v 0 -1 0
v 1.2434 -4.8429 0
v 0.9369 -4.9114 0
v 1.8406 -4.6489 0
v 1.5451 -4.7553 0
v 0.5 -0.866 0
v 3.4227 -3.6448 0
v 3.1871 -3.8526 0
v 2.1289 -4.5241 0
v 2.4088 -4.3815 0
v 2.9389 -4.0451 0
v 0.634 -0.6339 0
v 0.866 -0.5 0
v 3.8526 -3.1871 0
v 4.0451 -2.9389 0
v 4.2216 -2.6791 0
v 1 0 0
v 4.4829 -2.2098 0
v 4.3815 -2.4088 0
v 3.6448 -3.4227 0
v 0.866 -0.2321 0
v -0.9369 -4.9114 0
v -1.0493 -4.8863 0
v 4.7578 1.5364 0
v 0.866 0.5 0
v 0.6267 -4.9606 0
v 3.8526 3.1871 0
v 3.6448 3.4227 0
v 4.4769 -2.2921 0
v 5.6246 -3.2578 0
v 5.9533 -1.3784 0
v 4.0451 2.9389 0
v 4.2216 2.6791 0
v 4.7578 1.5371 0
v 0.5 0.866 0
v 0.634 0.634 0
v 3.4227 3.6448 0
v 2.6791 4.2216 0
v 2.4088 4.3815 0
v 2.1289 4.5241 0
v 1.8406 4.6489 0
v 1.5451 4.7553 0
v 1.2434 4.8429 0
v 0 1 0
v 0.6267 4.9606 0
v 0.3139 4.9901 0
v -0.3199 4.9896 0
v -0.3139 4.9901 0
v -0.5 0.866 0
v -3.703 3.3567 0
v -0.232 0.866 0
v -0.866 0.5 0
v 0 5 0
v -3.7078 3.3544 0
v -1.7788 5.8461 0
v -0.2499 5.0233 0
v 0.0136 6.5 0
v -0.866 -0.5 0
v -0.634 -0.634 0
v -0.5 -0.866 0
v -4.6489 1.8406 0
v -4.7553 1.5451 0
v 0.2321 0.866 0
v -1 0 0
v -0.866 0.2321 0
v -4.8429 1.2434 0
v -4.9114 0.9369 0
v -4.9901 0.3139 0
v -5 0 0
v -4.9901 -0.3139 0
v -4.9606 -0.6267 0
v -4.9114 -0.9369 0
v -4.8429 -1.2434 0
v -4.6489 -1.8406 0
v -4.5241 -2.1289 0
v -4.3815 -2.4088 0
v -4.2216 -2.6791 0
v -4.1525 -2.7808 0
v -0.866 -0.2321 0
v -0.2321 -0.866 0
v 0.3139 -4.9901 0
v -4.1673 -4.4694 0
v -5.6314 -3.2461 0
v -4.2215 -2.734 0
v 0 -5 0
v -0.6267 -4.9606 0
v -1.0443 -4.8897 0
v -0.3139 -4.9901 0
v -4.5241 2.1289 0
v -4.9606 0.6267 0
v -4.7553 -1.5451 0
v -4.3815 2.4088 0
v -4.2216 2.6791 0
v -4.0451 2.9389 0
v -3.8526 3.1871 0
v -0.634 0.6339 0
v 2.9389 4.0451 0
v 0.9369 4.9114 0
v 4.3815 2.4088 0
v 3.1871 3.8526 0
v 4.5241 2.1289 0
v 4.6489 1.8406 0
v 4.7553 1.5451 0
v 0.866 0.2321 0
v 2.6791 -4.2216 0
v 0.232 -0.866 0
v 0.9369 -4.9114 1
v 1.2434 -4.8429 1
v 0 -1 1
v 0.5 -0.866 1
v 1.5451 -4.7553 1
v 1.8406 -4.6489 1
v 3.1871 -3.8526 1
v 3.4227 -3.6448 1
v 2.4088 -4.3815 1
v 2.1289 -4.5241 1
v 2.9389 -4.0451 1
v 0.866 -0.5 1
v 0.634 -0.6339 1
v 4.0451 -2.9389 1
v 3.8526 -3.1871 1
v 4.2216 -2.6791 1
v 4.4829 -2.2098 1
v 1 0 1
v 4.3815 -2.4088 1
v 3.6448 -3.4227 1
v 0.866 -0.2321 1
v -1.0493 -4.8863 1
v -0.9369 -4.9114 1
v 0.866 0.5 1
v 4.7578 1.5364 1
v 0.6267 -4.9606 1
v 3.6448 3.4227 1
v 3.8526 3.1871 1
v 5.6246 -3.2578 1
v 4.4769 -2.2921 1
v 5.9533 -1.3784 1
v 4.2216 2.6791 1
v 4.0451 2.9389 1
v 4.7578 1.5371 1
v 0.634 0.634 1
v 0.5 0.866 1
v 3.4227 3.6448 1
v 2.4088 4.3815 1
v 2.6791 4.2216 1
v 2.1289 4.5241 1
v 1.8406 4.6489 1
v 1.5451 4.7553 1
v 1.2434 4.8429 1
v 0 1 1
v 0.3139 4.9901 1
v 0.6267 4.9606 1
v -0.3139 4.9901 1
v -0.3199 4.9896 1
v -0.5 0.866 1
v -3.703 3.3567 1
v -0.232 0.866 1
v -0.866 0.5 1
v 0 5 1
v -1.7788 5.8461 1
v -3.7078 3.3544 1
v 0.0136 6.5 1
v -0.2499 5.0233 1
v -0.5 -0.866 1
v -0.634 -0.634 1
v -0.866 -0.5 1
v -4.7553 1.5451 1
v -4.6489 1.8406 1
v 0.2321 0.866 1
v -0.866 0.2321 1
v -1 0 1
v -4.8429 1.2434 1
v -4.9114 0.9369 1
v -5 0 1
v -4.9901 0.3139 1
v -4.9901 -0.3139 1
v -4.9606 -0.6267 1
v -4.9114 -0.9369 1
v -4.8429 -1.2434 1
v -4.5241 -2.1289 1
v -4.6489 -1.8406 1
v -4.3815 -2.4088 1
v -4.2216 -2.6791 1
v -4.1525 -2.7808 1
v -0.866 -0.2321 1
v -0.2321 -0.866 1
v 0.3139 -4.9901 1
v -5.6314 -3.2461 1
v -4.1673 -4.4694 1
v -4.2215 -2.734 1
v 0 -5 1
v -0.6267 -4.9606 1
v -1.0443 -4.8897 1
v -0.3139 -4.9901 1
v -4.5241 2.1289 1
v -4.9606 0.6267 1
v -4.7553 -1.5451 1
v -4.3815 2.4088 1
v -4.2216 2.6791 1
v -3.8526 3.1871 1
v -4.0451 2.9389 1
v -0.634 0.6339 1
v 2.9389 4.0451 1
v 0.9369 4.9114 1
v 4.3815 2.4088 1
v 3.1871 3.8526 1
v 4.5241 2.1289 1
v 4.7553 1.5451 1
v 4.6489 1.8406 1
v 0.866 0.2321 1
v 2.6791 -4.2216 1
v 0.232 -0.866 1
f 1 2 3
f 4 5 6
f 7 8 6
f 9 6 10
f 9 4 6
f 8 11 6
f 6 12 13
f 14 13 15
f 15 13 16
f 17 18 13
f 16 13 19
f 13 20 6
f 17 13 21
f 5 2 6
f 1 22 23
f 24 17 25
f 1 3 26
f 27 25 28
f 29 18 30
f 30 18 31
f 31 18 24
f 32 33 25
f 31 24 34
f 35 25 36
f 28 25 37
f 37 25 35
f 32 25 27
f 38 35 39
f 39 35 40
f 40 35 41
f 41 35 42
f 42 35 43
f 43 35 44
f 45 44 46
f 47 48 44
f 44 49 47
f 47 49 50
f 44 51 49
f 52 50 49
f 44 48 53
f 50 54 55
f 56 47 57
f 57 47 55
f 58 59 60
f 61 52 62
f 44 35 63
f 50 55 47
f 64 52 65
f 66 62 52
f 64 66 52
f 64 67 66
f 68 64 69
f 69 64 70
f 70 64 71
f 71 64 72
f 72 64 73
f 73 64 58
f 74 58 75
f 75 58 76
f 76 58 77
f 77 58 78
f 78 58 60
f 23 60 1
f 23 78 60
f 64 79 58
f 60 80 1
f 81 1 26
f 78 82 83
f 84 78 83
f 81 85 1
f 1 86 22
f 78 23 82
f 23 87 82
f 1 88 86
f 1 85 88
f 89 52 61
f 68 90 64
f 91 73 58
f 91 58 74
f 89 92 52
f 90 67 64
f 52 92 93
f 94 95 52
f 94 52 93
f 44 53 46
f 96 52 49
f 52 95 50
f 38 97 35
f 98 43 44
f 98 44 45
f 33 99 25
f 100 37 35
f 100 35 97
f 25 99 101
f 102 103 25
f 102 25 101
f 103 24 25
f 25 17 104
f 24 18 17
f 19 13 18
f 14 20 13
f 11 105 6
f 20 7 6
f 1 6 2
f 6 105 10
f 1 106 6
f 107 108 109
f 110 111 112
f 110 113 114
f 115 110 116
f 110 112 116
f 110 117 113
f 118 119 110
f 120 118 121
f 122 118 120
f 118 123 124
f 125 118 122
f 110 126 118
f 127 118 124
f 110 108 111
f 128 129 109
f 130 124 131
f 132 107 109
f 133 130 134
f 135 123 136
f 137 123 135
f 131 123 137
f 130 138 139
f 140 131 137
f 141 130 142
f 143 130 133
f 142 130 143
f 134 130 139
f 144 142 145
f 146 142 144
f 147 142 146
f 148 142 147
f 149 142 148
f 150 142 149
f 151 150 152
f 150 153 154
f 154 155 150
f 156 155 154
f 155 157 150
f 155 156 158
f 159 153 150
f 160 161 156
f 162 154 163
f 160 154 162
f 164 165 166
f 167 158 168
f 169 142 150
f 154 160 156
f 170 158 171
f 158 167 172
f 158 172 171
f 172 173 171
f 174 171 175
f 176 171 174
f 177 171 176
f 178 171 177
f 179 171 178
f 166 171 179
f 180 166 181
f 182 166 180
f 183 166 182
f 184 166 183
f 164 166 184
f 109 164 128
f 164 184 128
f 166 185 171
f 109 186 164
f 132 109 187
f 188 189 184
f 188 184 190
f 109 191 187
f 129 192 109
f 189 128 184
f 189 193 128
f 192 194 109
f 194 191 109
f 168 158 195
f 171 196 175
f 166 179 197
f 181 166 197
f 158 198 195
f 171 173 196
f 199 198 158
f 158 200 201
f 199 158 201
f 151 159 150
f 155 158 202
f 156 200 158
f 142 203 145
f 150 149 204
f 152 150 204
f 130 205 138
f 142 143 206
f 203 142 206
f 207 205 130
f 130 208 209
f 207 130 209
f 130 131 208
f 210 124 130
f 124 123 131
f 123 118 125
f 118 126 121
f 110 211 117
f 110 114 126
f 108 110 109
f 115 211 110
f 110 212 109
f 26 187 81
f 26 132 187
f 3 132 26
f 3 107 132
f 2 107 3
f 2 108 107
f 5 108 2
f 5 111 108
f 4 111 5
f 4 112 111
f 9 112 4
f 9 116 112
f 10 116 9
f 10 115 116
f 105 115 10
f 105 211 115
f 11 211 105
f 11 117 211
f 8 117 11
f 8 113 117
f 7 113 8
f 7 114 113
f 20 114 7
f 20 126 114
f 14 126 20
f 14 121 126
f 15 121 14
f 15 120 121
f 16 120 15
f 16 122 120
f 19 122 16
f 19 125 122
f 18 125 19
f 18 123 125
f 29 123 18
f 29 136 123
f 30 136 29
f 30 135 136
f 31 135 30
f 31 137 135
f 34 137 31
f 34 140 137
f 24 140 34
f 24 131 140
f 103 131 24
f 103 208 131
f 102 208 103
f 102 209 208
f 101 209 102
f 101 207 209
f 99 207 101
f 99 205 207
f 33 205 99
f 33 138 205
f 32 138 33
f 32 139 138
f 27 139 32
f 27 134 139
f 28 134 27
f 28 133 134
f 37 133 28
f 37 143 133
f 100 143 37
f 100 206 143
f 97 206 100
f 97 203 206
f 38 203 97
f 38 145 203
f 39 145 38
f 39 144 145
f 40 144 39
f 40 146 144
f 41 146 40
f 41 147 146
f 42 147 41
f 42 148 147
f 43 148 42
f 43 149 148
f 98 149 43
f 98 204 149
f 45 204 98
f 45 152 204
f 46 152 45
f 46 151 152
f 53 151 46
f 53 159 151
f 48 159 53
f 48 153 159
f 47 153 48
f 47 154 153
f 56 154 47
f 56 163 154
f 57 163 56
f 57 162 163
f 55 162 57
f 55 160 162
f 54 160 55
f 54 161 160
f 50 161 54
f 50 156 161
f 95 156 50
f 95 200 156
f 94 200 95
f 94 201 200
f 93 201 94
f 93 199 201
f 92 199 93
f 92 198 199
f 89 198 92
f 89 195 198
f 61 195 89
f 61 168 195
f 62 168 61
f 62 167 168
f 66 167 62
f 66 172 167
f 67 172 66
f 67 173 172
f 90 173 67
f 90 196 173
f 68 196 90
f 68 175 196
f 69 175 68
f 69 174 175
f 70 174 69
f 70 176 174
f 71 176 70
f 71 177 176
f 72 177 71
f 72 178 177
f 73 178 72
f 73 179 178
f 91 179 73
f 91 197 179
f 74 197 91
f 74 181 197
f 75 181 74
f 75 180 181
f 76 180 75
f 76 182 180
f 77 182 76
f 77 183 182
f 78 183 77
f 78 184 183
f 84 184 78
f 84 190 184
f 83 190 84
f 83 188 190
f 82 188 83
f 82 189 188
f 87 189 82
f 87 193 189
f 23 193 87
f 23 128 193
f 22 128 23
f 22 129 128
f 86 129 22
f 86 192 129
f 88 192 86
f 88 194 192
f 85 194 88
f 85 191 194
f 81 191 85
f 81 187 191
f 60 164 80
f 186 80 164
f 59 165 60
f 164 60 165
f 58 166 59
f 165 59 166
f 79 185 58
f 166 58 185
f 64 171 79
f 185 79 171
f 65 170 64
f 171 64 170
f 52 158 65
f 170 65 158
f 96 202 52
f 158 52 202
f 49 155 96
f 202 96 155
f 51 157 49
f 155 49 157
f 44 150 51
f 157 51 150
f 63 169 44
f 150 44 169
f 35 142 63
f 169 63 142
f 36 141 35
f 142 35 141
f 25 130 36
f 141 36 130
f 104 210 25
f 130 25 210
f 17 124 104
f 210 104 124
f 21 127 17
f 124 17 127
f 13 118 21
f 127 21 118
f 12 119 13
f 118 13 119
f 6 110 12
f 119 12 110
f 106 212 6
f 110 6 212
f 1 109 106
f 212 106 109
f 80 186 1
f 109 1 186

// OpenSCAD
//Shredder Blade v1.1 (v1.0 had 69 downloads on Thingiverse)
//Ari M Diacou - July 2014
//Published at: http://www.thingiverse.com/thing:383635
//Shared under Creative Commons License: Attribution-ShareAlike 3.0 Unported (CC BY-SA 3.0) 
//see http://creativecommons.org/licenses/by-sa/3.0/

///////////////////// Parameters ///////////////////////////////////
//Diameter of the gear that the tooth extends from
diameter=10; 
//Perpendicular distance from the gear surface to the tooth tip
tooth_height=1.5; 
//Measure corner to corner of your axel/nut
bore_diameter=2; 
//Thickness of the gear. Set to 0 if you want to make a CNC drawing.
thickness=1;
//Sets the angular width of the tooth, A cicular saw blade would have N*TeethPerN teeth.
TeethPerN=2.5; 
//The pitch of the teeth in degrees
pitch=10;
circle_resolution=100;
Number_of_teeth=3;
//The number of sides in the borehole
bore_shape=12;//[4,6,12] 

                      /*[Hidden]*/
////////////////// Derived Constants ///////////////////////////
R=diameter/2;
$fs=0+0.01;
number_of_teeth=Number_of_teeth+0.001; //There was a bug for 3 and 5, which caused a "No top level geometry error" during F6, this is a catchall hack around it.
//////////////////////// MAIN() ////////////////////////////////
if(thickness<=$fs){ 
//Used if you want a drawing for CNC
	difference(){ 
		circle(r=diameter/2,$fn=100);
		bore(bore_shape);
		}
	teeth(number_of_teeth,TeethPerN);
	}

if(thickness>$fs){ 
//Used if you want an STL
	linear_extrude(thickness){
		difference(){
			circle(r=diameter/2,$fn=circle_resolution);
			bore(bore_shape);
			}
		teeth(number_of_teeth,TeethPerN);
		}
	}
/////////////////////// Functions ////////////////////////////
module bore(n=6){
	//creates a bore hole to attach the gear to, default is a hexagon
	if(n!=12)
		circle(r=bore_diameter/2,$fn=n);
	if(n==12)
		union(){
			circle(r=bore_diameter/2,$fn=6);
			rotate([0,0,360/12]) 
				circle(r=bore_diameter/2,$fn=6);
		}
	}	
	
module tooth1(N){
	//A tooth without pitch, N is the number of teeth around the gear
	theta=360/N/TeethPerN;
	A=[0,R];
	B=[-R*sin(theta), R*cos(theta)];
	C=[0,R+tooth_height];
	polygon([A,B,C]);
	}

module teeth(N){
	for(i=[1:N]){
		rotate(i*360/N) tooth3(N,pitch);
		}
	}

module tooth2(N, pitch=10){
	//A tooth with settable pitch
	theta=360/N/TeethPerN;
	B=[-R*sin(theta), R*cos(theta)];
	C=[0,R+tooth_height];
	A=C-tooth_height*[sin(pitch),cos(pitch)];
	polygon([A,B,C]);
	}

module tooth3(N, pitch=10){
	//A 4-point tooth with settable pitch
	theta=360/N/TeethPerN;
	theta2=theta/3;
	B=[-R*sin(theta), R*cos(theta)];
	C=[0,R+tooth_height];
	A=C-tooth_height*[sin(pitch),cos(pitch)];
	D=(R+tooth_height)*[-sin(theta2), cos(theta2+pitch)];
	polygon([A,B,D,C]);
	}
